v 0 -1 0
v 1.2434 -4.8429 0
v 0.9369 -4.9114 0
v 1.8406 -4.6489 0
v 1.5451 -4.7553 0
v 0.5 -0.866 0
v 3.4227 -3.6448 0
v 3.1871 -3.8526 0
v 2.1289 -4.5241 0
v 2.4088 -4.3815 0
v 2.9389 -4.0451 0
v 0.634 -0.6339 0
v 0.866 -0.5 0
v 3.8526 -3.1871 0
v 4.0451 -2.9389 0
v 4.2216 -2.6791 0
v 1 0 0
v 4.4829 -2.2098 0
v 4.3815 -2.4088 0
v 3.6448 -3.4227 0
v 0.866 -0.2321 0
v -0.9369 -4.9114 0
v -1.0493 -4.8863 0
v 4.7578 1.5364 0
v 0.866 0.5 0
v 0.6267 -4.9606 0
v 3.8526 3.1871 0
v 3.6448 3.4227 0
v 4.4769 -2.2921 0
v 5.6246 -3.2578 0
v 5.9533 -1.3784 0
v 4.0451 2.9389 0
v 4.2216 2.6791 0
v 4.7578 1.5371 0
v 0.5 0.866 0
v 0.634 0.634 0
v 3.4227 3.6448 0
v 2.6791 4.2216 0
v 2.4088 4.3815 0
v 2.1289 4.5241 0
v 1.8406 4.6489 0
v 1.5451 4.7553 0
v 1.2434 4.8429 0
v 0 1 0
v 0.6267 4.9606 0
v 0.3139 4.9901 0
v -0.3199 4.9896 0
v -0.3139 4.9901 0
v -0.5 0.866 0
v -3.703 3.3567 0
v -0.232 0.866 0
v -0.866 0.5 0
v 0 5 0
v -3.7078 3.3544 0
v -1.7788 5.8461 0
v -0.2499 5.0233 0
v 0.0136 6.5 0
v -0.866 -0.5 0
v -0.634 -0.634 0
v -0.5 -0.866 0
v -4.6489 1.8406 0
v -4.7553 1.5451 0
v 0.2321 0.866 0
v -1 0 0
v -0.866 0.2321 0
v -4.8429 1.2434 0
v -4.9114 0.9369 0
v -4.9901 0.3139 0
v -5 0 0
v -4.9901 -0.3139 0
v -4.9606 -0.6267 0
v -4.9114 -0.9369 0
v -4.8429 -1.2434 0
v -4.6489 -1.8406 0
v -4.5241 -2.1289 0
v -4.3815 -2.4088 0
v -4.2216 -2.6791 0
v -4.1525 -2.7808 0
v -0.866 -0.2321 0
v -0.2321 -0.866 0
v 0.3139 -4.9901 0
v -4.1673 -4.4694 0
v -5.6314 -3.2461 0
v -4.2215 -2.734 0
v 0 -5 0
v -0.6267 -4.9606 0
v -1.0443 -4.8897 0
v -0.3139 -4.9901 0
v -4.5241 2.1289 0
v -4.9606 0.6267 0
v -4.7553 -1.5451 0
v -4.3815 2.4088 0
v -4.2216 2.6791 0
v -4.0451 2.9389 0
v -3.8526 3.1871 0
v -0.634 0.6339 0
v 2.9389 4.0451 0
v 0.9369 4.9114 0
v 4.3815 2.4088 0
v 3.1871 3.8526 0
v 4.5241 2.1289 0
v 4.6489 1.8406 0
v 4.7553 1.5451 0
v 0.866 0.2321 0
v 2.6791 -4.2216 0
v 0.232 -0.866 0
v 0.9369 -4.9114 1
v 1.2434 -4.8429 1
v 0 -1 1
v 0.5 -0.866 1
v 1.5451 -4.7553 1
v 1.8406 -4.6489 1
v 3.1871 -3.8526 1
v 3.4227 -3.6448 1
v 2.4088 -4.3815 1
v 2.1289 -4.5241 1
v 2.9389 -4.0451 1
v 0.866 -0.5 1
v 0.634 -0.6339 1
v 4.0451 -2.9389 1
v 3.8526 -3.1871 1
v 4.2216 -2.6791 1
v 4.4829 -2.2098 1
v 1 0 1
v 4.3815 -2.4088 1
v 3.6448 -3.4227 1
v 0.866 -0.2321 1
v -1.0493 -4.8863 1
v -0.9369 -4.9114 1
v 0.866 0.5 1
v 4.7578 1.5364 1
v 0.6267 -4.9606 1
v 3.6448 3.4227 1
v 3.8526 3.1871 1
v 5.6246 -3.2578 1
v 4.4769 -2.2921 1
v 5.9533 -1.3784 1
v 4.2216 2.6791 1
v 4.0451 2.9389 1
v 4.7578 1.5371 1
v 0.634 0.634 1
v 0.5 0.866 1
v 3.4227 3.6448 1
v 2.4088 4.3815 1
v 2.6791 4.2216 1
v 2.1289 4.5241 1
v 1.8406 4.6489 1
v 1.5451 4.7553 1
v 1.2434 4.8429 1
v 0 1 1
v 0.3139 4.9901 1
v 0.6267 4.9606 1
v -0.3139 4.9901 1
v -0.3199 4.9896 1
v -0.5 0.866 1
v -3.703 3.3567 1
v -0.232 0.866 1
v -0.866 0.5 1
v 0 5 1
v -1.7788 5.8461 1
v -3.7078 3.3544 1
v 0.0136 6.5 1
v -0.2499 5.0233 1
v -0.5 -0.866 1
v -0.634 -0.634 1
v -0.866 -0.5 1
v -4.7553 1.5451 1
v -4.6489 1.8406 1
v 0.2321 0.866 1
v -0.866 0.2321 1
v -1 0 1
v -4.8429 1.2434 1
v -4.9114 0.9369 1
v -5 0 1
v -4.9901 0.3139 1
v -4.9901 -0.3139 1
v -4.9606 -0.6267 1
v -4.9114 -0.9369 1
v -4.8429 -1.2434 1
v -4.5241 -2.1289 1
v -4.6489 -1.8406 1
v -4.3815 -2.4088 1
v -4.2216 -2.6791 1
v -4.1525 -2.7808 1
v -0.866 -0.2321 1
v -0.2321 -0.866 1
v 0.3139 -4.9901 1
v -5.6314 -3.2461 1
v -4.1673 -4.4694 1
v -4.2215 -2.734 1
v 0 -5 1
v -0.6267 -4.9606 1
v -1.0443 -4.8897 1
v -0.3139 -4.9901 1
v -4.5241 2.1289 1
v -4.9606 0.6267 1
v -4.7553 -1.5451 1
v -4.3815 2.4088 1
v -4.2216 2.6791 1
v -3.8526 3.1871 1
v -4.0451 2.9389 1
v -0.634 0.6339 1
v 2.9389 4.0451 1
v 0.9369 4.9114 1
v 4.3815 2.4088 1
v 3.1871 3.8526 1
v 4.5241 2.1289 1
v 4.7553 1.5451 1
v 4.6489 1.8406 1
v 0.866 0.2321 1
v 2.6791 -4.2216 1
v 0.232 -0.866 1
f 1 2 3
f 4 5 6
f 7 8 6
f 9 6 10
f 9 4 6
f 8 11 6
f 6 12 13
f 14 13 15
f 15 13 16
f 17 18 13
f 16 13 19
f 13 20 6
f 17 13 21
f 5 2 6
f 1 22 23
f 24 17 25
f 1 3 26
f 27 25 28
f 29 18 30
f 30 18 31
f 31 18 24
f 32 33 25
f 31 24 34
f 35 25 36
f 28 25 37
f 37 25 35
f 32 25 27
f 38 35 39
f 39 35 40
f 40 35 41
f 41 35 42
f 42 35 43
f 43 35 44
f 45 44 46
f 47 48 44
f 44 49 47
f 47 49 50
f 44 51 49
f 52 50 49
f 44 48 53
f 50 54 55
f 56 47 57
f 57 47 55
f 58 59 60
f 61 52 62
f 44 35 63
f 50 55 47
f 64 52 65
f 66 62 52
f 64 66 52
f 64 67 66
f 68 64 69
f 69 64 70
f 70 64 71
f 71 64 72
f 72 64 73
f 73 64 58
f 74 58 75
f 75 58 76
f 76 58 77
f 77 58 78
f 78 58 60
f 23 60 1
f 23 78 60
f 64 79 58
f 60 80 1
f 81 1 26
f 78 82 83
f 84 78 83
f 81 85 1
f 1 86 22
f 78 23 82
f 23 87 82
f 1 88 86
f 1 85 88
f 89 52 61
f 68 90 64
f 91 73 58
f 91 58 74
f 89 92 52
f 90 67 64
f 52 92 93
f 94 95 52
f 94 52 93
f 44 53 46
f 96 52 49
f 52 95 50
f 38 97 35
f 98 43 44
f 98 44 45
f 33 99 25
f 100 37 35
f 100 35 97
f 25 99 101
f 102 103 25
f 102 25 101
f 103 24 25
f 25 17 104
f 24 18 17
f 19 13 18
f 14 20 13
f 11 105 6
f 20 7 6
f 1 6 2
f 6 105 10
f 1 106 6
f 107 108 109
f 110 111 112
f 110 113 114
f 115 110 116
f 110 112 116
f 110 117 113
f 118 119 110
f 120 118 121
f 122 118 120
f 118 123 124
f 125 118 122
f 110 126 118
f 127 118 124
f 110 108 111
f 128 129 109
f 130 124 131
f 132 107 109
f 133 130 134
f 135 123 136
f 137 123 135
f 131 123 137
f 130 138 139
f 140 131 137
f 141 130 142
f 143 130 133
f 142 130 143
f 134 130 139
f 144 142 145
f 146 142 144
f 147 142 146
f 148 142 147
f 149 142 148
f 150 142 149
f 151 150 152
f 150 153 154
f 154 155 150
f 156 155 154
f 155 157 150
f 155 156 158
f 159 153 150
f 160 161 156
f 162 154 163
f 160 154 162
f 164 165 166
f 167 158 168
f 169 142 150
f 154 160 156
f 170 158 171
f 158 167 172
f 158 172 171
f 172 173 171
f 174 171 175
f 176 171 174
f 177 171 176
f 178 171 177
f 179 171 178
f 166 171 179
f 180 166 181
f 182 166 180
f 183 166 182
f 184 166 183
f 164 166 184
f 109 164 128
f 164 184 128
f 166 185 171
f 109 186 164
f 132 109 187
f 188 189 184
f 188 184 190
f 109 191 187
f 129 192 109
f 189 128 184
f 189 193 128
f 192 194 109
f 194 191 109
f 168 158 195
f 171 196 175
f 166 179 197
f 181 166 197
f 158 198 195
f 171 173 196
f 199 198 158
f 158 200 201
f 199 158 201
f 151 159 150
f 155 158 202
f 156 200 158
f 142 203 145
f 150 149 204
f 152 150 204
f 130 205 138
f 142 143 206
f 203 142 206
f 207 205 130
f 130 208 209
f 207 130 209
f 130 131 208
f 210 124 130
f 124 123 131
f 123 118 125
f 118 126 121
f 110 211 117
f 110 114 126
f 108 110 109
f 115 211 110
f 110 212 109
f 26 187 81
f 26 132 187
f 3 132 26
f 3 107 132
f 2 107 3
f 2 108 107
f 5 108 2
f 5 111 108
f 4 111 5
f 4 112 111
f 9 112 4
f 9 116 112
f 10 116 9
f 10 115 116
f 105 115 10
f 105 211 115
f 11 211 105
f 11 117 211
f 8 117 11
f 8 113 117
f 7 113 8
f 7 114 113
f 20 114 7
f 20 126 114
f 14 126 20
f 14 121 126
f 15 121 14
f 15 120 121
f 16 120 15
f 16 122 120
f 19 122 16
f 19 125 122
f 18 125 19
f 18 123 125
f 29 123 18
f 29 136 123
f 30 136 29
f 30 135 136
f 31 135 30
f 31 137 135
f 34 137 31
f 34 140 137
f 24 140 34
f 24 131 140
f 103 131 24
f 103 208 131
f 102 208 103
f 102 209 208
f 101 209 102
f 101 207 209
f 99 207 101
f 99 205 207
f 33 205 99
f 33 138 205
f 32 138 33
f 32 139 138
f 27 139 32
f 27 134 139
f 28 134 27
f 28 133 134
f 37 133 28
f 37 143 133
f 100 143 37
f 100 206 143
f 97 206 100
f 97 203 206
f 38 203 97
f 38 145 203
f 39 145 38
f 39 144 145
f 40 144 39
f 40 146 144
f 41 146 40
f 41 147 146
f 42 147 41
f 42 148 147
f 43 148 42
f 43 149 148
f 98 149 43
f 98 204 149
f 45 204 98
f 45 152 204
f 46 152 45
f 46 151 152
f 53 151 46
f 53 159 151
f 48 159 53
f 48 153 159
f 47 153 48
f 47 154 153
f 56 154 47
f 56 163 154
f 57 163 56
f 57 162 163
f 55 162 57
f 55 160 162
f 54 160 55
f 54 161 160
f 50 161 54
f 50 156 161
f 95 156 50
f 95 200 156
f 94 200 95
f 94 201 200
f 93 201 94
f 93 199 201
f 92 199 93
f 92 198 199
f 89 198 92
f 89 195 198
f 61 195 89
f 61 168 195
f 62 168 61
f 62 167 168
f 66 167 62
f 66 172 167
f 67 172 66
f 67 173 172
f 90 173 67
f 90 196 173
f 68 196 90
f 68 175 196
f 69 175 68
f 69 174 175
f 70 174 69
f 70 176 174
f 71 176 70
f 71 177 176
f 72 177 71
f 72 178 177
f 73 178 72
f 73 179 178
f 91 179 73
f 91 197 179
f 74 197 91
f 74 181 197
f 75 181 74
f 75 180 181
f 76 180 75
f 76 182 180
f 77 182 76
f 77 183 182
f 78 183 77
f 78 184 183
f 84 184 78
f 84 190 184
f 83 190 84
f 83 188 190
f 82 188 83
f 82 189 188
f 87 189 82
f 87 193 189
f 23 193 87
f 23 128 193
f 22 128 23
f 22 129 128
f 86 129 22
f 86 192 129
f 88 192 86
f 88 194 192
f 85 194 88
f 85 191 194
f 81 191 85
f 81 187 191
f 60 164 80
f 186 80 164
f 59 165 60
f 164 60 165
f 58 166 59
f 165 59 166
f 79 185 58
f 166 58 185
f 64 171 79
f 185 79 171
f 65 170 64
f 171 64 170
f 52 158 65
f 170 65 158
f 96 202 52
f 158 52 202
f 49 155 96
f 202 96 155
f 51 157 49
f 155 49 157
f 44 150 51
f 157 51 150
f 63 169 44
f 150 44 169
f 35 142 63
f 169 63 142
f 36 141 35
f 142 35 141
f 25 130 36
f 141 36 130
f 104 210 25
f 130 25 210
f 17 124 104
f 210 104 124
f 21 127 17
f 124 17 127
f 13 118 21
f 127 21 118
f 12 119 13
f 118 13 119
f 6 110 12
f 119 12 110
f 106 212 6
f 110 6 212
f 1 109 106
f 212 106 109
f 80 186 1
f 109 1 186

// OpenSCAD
//Shredder Blade v1.1 (v1.0 had 69 downloads on Thingiverse)
//Ari M Diacou - July 2014
//Published at: http://www.thingiverse.com/thing:383635
//Shared under Creative Commons License: Attribution-ShareAlike 3.0 Unported (CC BY-SA 3.0) 
//see http://creativecommons.org/licenses/by-sa/3.0/

///////////////////// Parameters ///////////////////////////////////
//Diameter of the gear that the tooth extends from
diameter=10; 
//Perpendicular distance from the gear surface to the tooth tip
tooth_height=1.5; 
//Measure corner to corner of your axel/nut
bore_diameter=2; 
//Thickness of the gear. Set to 0 if you want to make a CNC drawing.
thickness=1;
//Sets the angular width of the tooth, A cicular saw blade would have N*TeethPerN teeth.
TeethPerN=2.5; 
//The pitch of the teeth in degrees
pitch=10;
circle_resolution=100;
Number_of_teeth=3;
//The number of sides in the borehole
bore_shape=12;//[4,6,12] 

                      /*[Hidden]*/
////////////////// Derived Constants ///////////////////////////
R=diameter/2;
$fs=0+0.01;
number_of_teeth=Number_of_teeth+0.001; //There was a bug for 3 and 5, which caused a "No top level geometry error" during F6, this is a catchall hack around it.
//////////////////////// MAIN() ////////////////////////////////
if(thickness<=$fs){ 
//Used if you want a drawing for CNC
	difference(){ 
		circle(r=diameter/2,$fn=100);
		bore(bore_shape);
		}
	teeth(number_of_teeth,TeethPerN);
	}

if(thickness>$fs){ 
//Used if you want an STL
	linear_extrude(thickness){
		difference(){
			circle(r=diameter/2,$fn=circle_resolution);
			bore(bore_shape);
			}
		teeth(number_of_teeth,TeethPerN);
		}
	}
/////////////////////// Functions ////////////////////////////
module bore(n=6){
	//creates a bore hole to attach the gear to, default is a hexagon
	if(n!=12)
		circle(r=bore_diameter/2,$fn=n);
	if(n==12)
		union(){
			circle(r=bore_diameter/2,$fn=6);
			rotate([0,0,360/12]) 
				circle(r=bore_diameter/2,$fn=6);
		}
	}	
	
module tooth1(N){
	//A tooth without pitch, N is the number of teeth around the gear
	theta=360/N/TeethPerN;
	A=[0,R];
	B=[-R*sin(theta), R*cos(theta)];
	C=[0,R+tooth_height];
	polygon([A,B,C]);
	}

module teeth(N){
	for(i=[1:N]){
		rotate(i*360/N) tooth3(N,pitch);
		}
	}

module tooth2(N, pitch=10){
	//A tooth with settable pitch
	theta=360/N/TeethPerN;
	B=[-R*sin(theta), R*cos(theta)];
	C=[0,R+tooth_height];
	A=C-tooth_height*[sin(pitch),cos(pitch)];
	polygon([A,B,C]);
	}

module tooth3(N, pitch=10){
	//A 4-point tooth with settable pitch
	theta=360/N/TeethPerN;
	theta2=theta/3;
	B=[-R*sin(theta), R*cos(theta)];
	C=[0,R+tooth_height];
	A=C-tooth_height*[sin(pitch),cos(pitch)];
	D=(R+tooth_height)*[-sin(theta2), cos(theta2+pitch)];
	polygon([A,B,D,C]);
	}
